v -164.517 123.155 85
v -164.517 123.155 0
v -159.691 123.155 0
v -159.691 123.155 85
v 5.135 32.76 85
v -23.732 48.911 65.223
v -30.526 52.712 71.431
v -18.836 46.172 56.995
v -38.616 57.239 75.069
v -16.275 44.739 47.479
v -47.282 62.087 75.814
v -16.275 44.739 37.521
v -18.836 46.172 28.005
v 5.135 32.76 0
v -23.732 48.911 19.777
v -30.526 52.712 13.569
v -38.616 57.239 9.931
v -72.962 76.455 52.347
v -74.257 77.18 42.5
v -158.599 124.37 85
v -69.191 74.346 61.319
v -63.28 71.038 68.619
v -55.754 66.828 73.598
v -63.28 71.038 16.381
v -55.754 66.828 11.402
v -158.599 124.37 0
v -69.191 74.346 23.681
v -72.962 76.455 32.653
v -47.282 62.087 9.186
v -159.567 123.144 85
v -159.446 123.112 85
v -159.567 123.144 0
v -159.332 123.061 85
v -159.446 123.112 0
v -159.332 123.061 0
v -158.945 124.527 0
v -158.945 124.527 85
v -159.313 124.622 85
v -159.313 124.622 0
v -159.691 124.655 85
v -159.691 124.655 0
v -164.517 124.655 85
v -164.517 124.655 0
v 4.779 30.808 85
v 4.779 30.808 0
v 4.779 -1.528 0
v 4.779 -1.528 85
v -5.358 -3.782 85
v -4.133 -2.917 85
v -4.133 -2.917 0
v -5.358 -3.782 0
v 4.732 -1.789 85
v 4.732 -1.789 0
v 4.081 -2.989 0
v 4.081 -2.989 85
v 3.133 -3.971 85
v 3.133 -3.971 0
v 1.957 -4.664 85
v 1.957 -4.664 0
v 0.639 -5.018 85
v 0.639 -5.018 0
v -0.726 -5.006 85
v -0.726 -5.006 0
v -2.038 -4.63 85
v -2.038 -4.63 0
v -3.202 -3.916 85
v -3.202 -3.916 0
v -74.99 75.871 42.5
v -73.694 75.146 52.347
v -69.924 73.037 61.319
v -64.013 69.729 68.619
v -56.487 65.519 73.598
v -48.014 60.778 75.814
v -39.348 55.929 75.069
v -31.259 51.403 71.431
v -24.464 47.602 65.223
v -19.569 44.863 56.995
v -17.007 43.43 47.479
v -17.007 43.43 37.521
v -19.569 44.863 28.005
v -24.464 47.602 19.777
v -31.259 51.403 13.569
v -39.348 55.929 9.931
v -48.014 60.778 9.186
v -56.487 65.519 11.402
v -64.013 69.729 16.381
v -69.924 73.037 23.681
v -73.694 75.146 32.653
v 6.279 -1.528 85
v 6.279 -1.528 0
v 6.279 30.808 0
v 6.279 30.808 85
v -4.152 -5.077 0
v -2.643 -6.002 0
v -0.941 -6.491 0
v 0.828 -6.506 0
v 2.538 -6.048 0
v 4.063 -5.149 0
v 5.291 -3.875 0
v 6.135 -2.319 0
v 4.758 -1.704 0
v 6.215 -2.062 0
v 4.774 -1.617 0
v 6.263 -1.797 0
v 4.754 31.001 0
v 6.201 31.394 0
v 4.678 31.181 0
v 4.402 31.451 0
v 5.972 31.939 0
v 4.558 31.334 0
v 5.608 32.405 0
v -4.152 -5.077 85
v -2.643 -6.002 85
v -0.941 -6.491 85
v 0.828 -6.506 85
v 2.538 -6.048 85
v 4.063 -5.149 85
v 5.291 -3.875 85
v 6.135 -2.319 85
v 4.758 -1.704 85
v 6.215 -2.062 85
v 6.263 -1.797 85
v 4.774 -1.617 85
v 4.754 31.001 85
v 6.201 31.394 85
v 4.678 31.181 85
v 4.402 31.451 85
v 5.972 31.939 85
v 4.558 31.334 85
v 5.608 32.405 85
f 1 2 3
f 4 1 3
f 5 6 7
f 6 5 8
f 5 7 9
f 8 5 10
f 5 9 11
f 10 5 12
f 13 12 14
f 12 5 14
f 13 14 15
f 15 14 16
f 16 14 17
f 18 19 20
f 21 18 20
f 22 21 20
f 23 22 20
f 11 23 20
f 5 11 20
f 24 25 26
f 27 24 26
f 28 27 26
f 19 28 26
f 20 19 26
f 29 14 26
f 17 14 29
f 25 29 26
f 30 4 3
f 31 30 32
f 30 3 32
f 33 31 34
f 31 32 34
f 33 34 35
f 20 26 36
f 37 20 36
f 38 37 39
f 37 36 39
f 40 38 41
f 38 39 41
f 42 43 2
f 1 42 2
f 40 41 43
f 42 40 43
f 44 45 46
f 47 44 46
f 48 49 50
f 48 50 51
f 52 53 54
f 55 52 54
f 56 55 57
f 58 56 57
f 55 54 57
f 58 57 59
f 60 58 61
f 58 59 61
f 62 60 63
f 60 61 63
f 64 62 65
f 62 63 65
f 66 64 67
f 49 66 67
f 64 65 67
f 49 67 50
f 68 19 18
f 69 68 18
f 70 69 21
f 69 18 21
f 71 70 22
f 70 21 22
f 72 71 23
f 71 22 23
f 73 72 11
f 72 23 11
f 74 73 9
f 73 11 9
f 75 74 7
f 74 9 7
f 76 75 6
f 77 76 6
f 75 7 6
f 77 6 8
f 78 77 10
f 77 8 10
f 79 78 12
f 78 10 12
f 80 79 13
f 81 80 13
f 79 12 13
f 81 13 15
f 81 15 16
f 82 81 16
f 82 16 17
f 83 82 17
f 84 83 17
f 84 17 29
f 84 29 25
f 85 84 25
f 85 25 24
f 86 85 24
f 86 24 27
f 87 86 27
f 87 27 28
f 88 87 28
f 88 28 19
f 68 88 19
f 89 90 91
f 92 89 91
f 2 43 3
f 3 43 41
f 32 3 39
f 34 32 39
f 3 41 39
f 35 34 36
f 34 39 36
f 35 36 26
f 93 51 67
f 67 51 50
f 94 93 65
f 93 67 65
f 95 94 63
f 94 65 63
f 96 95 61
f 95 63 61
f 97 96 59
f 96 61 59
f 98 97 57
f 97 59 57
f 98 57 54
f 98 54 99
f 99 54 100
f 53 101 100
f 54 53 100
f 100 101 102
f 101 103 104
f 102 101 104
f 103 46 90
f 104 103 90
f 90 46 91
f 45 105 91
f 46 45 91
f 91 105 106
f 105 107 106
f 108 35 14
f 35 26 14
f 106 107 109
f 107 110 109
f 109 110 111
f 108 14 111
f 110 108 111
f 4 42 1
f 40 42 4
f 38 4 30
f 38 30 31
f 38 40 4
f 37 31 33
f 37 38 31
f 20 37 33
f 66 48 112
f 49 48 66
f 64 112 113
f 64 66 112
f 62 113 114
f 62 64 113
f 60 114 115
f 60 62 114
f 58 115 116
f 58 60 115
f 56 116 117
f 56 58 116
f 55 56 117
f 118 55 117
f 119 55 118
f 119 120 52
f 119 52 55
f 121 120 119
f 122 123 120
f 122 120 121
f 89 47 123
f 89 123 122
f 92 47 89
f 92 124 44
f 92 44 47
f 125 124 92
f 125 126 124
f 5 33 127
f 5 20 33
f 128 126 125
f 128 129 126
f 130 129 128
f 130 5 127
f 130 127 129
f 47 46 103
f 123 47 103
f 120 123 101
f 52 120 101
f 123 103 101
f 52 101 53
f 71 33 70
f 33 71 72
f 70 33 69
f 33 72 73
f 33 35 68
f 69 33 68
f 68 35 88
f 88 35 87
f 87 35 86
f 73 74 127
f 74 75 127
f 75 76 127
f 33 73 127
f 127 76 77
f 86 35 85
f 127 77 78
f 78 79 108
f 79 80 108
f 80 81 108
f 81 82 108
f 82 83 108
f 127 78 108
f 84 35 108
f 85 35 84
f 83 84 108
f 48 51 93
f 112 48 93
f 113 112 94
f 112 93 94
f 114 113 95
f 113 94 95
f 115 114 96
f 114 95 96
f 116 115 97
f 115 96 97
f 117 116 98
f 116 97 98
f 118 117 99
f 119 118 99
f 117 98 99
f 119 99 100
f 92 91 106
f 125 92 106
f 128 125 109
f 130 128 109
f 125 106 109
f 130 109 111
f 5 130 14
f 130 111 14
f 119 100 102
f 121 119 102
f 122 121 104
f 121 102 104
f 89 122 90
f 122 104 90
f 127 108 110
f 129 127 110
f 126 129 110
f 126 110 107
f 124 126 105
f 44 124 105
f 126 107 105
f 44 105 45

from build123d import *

# Parameters (mm, degrees)
BASE_FLANGE1_DEPTH = 85
SKETCH2_R          = 33.407017116
CUT_EXTRUDE1_DEPTH = 30


# Read off the part's stored shape, not the designer's step: Base-Flange1
with BuildPart() as part:
    # Base-Flange1 outline → Base-Flange1 (new body)
    with BuildSketch(Plane.XY):
        with BuildLine():
            ThreePointArc((4.779318239, -1.528186345), (4.767324577, -1.660569184), (4.731734161, -1.788640985))
            ThreePointArc((4.731734161, -1.788640985), (0.638889027, -5.018004141), (-4.132584418, -2.917240267))
            Line((-4.132584418, -2.917240267), (-5.358019189, -3.782289181))
            ThreePointArc((-5.358019189, -3.782289181), (0.828338715, -6.505992318), (6.134834735, -2.319026486))
            ThreePointArc((6.134834735, -2.319026486), (6.242900881, -1.930151397), (6.279318239, -1.528186345))
            Line((6.279318239, -1.528186345), (6.279318239, 30.807933335))
            ThreePointArc((6.279318239, 30.807933335), (5.972085307, 31.939269835), (5.134793267, 32.759791858))
            Line((5.134793267, 32.759791858), (-158.599410427, 124.369933097))
            ThreePointArc((-158.599410427, 124.369933097), (-159.127192628, 124.582318822), (-159.691485454, 124.654674574))
            Line((-159.691485454, 124.654674574), (-164.516949266, 124.654674574))
            Line((-164.516949266, 124.654674574), (-164.516949266, 123.154674574))
            Line((-164.516949266, 123.154674574), (-159.691485454, 123.154674574))
            ThreePointArc((-159.691485454, 123.154674574), (-159.50564172, 123.13084499), (-159.331822365, 123.060898051))
            Line((-159.331822365, 123.060898051), (4.402381329, 31.450756812))
            ThreePointArc((4.402381329, 31.450756812), (4.678134399, 31.180526765), (4.779318239, 30.807933335))
            Line((4.779318239, 30.807933335), (4.779318239, -1.528186345))
        make_face()
    extrude(amount=BASE_FLANGE1_DEPTH)

    # Sketch2 → Cut-Extrude1 (cut)
    with BuildSketch(Plane(origin=(15.183550365, 27.137459833, 0), x_dir=(0.872690030929894, -0.48827462550861755, 0), z_dir=(0.48827462550861755, 0.872690030929894, 0))):
        with Locations(Location((-69.081583233, -42.5, 0), (0, 0, 180))):
            Circle(SKETCH2_R)
    extrude(amount=-CUT_EXTRUDE1_DEPTH, mode=Mode.SUBTRACT)


solid = part.part
